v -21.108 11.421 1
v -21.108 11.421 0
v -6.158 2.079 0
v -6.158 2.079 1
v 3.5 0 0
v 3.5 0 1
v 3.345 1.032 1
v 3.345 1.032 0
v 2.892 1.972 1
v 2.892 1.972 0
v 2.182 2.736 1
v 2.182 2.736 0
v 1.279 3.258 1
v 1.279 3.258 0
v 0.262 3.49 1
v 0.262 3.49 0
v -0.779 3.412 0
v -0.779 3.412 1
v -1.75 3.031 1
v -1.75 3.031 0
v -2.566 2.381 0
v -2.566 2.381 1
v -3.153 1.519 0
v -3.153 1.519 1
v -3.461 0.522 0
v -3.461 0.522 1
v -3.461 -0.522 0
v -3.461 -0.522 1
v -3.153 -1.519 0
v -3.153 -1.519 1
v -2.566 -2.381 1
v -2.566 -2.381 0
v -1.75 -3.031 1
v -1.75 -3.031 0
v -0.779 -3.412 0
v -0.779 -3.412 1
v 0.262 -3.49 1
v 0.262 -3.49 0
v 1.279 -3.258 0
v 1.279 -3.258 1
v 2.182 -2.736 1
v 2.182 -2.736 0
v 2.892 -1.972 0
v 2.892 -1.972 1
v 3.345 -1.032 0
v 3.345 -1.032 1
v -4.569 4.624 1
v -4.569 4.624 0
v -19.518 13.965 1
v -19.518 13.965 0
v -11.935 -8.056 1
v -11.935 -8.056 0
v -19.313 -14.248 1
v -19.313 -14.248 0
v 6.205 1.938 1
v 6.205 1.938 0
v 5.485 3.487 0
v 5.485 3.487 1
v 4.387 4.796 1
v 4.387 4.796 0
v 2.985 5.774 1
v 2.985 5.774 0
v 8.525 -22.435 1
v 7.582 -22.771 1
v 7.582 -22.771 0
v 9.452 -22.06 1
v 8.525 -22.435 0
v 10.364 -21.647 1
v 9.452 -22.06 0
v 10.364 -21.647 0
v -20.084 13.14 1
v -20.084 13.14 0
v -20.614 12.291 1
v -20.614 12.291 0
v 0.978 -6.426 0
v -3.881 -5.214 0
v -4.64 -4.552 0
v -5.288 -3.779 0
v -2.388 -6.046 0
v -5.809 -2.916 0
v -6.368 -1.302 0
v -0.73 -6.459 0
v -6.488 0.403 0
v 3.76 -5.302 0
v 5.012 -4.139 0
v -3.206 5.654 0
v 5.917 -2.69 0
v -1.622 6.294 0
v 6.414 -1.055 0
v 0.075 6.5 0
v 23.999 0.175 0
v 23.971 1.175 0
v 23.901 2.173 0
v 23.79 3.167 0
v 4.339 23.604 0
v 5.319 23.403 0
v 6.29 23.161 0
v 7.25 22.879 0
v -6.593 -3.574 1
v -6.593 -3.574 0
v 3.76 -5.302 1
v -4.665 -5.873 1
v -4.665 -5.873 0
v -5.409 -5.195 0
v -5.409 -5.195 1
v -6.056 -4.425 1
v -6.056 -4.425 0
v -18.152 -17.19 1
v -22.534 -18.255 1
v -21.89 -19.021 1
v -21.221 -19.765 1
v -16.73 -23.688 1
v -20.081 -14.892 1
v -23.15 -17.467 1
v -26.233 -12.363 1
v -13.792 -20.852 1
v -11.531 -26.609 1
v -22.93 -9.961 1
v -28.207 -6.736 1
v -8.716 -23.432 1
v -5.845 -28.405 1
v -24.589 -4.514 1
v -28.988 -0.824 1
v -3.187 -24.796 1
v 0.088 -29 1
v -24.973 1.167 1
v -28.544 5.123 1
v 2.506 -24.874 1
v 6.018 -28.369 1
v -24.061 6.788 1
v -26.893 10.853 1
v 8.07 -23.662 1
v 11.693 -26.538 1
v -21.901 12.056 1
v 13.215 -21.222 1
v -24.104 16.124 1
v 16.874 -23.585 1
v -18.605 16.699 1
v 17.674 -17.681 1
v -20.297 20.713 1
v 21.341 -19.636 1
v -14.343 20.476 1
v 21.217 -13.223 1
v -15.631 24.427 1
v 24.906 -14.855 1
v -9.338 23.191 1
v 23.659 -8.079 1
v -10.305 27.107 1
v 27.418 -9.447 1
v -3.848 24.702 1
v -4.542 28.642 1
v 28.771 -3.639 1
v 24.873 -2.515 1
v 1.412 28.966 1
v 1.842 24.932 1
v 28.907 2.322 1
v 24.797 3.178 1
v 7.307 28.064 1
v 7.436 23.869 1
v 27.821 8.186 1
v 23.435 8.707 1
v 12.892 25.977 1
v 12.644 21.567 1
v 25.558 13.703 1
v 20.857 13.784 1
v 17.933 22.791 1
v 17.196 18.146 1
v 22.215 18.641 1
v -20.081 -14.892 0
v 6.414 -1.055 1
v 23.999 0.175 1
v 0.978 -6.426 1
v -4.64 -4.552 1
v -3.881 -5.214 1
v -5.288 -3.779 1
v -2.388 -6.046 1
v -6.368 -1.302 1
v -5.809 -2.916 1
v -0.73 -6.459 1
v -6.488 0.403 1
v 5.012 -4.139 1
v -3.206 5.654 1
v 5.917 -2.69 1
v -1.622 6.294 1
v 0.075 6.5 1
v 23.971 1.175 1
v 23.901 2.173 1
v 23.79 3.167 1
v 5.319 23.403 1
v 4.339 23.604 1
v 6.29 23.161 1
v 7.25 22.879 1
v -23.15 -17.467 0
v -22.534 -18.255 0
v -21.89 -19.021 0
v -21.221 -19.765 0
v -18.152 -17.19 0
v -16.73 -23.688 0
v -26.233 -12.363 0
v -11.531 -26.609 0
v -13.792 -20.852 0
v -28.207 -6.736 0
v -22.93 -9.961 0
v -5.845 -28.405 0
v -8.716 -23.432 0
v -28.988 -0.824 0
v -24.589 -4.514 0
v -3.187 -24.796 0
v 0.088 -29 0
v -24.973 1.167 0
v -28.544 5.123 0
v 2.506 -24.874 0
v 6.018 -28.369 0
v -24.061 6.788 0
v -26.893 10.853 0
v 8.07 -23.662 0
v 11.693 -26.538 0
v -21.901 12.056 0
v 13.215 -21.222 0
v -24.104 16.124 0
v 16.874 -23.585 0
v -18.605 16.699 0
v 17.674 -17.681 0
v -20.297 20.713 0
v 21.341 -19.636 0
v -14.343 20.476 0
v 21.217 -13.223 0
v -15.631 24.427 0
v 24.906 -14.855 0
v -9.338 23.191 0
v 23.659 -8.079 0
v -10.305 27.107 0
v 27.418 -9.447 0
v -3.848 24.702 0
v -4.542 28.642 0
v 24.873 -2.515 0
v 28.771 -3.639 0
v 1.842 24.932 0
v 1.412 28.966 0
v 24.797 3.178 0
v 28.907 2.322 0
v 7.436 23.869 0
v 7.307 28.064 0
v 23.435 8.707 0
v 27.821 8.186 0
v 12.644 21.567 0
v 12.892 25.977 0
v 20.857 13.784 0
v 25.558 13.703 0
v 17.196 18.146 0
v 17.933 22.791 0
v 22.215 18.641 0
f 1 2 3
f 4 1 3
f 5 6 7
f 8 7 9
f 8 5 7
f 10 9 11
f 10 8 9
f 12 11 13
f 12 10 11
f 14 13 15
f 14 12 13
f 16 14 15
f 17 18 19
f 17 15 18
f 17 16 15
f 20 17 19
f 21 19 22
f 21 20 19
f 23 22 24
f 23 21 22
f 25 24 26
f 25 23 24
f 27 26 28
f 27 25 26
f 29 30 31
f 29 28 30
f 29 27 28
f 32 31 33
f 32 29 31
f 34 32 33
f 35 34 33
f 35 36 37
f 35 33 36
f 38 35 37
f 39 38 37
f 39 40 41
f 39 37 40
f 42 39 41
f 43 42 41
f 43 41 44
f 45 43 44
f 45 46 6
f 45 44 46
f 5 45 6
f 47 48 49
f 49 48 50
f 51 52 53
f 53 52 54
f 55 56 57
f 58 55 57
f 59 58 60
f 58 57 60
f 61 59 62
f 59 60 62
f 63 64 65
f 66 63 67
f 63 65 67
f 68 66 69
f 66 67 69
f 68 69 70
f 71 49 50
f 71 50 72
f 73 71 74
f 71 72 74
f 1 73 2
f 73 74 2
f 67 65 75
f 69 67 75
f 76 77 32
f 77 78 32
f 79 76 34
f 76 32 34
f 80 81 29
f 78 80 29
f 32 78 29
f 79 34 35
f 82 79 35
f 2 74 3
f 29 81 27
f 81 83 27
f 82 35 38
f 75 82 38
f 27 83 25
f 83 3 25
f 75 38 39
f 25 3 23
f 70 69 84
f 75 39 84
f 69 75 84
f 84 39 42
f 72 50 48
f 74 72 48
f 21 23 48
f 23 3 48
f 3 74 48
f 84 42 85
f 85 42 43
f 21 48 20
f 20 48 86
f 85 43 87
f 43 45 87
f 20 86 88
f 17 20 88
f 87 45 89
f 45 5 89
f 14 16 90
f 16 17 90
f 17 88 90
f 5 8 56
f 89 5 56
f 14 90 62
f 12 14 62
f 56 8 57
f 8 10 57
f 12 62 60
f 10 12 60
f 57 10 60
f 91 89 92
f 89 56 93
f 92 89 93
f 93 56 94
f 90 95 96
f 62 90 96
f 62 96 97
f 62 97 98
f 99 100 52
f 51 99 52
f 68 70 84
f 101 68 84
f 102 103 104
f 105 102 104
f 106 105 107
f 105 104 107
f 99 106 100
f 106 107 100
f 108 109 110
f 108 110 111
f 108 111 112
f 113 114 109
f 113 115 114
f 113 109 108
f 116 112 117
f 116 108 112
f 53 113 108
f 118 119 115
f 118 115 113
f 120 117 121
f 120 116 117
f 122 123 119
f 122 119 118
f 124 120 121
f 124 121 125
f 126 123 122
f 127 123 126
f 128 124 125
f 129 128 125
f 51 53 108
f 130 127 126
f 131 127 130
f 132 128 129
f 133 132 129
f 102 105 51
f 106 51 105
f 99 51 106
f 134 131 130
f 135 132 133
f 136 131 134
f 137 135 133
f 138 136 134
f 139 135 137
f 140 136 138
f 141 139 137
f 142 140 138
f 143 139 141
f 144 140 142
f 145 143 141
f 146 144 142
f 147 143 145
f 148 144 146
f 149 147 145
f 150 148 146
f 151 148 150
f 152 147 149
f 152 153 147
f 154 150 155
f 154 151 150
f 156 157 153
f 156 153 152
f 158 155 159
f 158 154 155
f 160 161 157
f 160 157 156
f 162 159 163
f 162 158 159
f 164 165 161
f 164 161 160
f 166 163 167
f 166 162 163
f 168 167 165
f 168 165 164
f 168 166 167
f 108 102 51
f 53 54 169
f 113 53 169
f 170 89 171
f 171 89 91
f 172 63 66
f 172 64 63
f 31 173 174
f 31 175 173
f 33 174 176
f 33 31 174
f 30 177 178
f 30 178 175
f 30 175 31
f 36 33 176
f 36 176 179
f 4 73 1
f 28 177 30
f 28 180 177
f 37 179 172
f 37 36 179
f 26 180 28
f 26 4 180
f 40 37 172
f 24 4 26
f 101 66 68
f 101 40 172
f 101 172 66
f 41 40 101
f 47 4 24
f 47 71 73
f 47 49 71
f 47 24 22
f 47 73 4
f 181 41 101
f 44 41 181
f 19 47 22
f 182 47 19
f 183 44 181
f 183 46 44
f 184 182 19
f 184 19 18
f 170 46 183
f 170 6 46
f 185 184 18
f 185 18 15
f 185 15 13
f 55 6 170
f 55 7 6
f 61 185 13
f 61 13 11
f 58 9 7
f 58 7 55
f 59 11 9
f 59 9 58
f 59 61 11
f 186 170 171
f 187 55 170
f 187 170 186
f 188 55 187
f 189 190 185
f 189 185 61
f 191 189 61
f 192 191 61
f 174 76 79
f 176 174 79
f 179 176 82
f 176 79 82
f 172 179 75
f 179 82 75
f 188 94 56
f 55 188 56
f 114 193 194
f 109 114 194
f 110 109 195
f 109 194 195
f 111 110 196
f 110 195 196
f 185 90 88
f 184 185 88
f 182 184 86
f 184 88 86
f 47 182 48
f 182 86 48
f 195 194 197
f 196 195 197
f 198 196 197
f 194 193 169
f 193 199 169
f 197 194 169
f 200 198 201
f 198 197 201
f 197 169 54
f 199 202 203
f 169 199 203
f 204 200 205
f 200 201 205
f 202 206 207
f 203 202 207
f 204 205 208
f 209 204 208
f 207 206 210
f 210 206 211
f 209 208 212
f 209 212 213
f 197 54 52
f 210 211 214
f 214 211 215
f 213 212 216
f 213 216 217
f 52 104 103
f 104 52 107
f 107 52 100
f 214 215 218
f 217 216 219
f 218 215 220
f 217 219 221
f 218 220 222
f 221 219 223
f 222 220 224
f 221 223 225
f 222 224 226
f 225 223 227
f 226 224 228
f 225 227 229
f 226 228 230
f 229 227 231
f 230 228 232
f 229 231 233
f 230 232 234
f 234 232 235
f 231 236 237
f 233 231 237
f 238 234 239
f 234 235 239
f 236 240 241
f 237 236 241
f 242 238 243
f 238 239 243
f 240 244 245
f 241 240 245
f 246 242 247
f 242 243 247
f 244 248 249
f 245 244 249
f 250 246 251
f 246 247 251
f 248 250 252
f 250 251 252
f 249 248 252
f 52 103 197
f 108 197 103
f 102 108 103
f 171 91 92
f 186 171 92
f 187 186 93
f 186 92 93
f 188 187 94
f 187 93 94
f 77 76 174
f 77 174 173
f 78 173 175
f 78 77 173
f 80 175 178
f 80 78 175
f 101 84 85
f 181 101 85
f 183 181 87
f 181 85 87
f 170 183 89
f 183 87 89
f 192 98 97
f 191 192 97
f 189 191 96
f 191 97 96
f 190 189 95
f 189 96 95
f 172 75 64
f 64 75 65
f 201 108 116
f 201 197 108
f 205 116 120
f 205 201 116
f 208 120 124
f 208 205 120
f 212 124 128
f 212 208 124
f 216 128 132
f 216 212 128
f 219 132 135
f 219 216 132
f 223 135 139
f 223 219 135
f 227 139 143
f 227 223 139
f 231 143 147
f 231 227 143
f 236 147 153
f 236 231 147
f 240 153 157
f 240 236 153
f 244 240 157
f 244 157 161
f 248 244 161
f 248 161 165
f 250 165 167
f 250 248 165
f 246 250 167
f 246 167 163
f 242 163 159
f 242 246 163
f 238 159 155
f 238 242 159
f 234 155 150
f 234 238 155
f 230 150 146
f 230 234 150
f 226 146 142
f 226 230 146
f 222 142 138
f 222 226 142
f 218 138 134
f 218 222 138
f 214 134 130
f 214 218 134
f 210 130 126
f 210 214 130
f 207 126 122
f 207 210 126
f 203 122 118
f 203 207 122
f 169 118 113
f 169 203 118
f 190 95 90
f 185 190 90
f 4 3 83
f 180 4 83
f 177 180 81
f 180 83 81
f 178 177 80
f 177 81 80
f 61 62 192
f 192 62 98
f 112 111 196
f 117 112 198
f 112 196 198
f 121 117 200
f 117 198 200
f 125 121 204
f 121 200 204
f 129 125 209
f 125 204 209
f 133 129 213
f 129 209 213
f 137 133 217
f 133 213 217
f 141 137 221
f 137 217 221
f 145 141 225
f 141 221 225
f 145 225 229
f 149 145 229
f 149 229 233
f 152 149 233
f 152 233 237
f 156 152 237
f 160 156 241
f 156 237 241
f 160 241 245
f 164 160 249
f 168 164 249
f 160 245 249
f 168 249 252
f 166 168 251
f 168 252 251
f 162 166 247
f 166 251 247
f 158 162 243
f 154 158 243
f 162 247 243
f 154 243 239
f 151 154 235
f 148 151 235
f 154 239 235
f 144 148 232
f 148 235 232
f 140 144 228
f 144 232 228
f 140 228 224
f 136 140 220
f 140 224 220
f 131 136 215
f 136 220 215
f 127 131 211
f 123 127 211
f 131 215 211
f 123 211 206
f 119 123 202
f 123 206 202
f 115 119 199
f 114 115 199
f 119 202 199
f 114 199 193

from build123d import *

# Parameters (mm, degrees)
F3_DEPTH  = 1
F5_COUNT  = 5
F6_R      = 6.5
F8_DEPTH  = 1
F7_R      = 3.5
F9_DEPTH  = 1.001
F10_R     = 29
F10_R_2   = 25
F11_DEPTH = 1
F12_R     = 25
F12_R_2   = 24
F13_DEPTH = 1.001
F15_DEPTH = 1.001
F17_DEPTH = 1


with BuildPart() as f3:
    # F1 (on Top) → F3 (new body)
    with BuildSketch(Plane.XY):
        Polygon((-20.1152924925, -14.9206235775), (-18.1869296634, -17.2187569068), (-3.8807090438, -5.2144124614), (-3.1088401015, -2.6086265826), (-5.8090718729, -2.916279132), align=None)
    extrude(amount=F3_DEPTH)


with BuildPart() as f5_1:
    # F5: instance of F3
    add(f3.part.rotate(Axis((0, 0, 17.3033885658), (0, 0, 1)), 1 * 360 / F5_COUNT))


with BuildPart() as f5_2:
    # F5: instance of F3
    add(f3.part.rotate(Axis((0, 0, 17.3033885658), (0, 0, 1)), 2 * 360 / F5_COUNT))


with BuildPart() as f5_3:
    # F5: instance of F3
    add(f3.part.rotate(Axis((0, 0, 17.3033885658), (0, 0, 1)), 3 * 360 / F5_COUNT))


with BuildPart() as f5_4:
    # F5: instance of F3
    add(f3.part.rotate(Axis((0, 0, 17.3033885658), (0, 0, 1)), 4 * 360 / F5_COUNT))


with BuildPart() as f3_1:
    add(f3.part)

    add(f5_1.part)  # F8 merges F5_1

    add(f5_2.part)  # F8 merges F5_2

    add(f5_3.part)  # F8 merges F5_3

    add(f5_4.part)  # F8 merges F5_4
    # F6 (on Top) → F8 (join)
    with BuildSketch(Plane.XY):
        Circle(F6_R)
    extrude(amount=F8_DEPTH)

    # F7 (on Top) → F9 (cut, through all)
    with BuildSketch(Plane.XY):
        Circle(F7_R)
    extrude(amount=F9_DEPTH, mode=Mode.SUBTRACT)

    # F10 (on Top) → F11 (join, through all)
    with BuildSketch(Plane.XY):
        Circle(F10_R)
        Circle(F10_R_2, mode=Mode.SUBTRACT)
    extrude(amount=F11_DEPTH)

    # F12 (on Top) → F13 (cut, through all)
    with BuildSketch(Plane.XY):
        Circle(F12_R)
        Circle(F12_R_2, mode=Mode.SUBTRACT)
    extrude(amount=F13_DEPTH, mode=Mode.SUBTRACT)

    # F14 (on Top) → F15 (cut, through all)
    with BuildSketch(Plane.XY):
        with BuildLine():
            ThreePointArc((-2.2854405272, -6.0849619224), (-4.7407313578, -4.4469614562), (-6.2185340336, -1.8920450503))
            Line((-6.2185340336, -1.8920450503), (-18.8992489129, -15.5668277293))
            Line((-18.8992489129, -15.5668277293), (-15.3703698888, -18.8940558583))
            Line((-15.3703698888, -18.8940558583), (-2.2854405272, -6.0849619224))
        make_face()
    extrude(amount=F15_DEPTH, mode=Mode.SUBTRACT)

    # F16 (on Top) → F17 (join, through all)
    with BuildSketch(Plane.XY):
        with BuildLine():
            ThreePointArc((-4.6650726033, -5.8725716348), (-5.7453333234, -4.8209070726), (-6.5934354323, -3.5744383055))
            Line((-6.5934354323, -3.5744383055), (-23.1497331207, -17.4668215895))
            ThreePointArc((-23.1497331207, -17.4668215895), (-22.2152888505, -18.6408406809), (-21.2213702917, -19.7649549188))
            Line((-21.2213702917, -19.7649549188), (-4.6650726033, -5.8725716348))
        make_face()
    extrude(amount=F17_DEPTH)


solid = f3_1.part
